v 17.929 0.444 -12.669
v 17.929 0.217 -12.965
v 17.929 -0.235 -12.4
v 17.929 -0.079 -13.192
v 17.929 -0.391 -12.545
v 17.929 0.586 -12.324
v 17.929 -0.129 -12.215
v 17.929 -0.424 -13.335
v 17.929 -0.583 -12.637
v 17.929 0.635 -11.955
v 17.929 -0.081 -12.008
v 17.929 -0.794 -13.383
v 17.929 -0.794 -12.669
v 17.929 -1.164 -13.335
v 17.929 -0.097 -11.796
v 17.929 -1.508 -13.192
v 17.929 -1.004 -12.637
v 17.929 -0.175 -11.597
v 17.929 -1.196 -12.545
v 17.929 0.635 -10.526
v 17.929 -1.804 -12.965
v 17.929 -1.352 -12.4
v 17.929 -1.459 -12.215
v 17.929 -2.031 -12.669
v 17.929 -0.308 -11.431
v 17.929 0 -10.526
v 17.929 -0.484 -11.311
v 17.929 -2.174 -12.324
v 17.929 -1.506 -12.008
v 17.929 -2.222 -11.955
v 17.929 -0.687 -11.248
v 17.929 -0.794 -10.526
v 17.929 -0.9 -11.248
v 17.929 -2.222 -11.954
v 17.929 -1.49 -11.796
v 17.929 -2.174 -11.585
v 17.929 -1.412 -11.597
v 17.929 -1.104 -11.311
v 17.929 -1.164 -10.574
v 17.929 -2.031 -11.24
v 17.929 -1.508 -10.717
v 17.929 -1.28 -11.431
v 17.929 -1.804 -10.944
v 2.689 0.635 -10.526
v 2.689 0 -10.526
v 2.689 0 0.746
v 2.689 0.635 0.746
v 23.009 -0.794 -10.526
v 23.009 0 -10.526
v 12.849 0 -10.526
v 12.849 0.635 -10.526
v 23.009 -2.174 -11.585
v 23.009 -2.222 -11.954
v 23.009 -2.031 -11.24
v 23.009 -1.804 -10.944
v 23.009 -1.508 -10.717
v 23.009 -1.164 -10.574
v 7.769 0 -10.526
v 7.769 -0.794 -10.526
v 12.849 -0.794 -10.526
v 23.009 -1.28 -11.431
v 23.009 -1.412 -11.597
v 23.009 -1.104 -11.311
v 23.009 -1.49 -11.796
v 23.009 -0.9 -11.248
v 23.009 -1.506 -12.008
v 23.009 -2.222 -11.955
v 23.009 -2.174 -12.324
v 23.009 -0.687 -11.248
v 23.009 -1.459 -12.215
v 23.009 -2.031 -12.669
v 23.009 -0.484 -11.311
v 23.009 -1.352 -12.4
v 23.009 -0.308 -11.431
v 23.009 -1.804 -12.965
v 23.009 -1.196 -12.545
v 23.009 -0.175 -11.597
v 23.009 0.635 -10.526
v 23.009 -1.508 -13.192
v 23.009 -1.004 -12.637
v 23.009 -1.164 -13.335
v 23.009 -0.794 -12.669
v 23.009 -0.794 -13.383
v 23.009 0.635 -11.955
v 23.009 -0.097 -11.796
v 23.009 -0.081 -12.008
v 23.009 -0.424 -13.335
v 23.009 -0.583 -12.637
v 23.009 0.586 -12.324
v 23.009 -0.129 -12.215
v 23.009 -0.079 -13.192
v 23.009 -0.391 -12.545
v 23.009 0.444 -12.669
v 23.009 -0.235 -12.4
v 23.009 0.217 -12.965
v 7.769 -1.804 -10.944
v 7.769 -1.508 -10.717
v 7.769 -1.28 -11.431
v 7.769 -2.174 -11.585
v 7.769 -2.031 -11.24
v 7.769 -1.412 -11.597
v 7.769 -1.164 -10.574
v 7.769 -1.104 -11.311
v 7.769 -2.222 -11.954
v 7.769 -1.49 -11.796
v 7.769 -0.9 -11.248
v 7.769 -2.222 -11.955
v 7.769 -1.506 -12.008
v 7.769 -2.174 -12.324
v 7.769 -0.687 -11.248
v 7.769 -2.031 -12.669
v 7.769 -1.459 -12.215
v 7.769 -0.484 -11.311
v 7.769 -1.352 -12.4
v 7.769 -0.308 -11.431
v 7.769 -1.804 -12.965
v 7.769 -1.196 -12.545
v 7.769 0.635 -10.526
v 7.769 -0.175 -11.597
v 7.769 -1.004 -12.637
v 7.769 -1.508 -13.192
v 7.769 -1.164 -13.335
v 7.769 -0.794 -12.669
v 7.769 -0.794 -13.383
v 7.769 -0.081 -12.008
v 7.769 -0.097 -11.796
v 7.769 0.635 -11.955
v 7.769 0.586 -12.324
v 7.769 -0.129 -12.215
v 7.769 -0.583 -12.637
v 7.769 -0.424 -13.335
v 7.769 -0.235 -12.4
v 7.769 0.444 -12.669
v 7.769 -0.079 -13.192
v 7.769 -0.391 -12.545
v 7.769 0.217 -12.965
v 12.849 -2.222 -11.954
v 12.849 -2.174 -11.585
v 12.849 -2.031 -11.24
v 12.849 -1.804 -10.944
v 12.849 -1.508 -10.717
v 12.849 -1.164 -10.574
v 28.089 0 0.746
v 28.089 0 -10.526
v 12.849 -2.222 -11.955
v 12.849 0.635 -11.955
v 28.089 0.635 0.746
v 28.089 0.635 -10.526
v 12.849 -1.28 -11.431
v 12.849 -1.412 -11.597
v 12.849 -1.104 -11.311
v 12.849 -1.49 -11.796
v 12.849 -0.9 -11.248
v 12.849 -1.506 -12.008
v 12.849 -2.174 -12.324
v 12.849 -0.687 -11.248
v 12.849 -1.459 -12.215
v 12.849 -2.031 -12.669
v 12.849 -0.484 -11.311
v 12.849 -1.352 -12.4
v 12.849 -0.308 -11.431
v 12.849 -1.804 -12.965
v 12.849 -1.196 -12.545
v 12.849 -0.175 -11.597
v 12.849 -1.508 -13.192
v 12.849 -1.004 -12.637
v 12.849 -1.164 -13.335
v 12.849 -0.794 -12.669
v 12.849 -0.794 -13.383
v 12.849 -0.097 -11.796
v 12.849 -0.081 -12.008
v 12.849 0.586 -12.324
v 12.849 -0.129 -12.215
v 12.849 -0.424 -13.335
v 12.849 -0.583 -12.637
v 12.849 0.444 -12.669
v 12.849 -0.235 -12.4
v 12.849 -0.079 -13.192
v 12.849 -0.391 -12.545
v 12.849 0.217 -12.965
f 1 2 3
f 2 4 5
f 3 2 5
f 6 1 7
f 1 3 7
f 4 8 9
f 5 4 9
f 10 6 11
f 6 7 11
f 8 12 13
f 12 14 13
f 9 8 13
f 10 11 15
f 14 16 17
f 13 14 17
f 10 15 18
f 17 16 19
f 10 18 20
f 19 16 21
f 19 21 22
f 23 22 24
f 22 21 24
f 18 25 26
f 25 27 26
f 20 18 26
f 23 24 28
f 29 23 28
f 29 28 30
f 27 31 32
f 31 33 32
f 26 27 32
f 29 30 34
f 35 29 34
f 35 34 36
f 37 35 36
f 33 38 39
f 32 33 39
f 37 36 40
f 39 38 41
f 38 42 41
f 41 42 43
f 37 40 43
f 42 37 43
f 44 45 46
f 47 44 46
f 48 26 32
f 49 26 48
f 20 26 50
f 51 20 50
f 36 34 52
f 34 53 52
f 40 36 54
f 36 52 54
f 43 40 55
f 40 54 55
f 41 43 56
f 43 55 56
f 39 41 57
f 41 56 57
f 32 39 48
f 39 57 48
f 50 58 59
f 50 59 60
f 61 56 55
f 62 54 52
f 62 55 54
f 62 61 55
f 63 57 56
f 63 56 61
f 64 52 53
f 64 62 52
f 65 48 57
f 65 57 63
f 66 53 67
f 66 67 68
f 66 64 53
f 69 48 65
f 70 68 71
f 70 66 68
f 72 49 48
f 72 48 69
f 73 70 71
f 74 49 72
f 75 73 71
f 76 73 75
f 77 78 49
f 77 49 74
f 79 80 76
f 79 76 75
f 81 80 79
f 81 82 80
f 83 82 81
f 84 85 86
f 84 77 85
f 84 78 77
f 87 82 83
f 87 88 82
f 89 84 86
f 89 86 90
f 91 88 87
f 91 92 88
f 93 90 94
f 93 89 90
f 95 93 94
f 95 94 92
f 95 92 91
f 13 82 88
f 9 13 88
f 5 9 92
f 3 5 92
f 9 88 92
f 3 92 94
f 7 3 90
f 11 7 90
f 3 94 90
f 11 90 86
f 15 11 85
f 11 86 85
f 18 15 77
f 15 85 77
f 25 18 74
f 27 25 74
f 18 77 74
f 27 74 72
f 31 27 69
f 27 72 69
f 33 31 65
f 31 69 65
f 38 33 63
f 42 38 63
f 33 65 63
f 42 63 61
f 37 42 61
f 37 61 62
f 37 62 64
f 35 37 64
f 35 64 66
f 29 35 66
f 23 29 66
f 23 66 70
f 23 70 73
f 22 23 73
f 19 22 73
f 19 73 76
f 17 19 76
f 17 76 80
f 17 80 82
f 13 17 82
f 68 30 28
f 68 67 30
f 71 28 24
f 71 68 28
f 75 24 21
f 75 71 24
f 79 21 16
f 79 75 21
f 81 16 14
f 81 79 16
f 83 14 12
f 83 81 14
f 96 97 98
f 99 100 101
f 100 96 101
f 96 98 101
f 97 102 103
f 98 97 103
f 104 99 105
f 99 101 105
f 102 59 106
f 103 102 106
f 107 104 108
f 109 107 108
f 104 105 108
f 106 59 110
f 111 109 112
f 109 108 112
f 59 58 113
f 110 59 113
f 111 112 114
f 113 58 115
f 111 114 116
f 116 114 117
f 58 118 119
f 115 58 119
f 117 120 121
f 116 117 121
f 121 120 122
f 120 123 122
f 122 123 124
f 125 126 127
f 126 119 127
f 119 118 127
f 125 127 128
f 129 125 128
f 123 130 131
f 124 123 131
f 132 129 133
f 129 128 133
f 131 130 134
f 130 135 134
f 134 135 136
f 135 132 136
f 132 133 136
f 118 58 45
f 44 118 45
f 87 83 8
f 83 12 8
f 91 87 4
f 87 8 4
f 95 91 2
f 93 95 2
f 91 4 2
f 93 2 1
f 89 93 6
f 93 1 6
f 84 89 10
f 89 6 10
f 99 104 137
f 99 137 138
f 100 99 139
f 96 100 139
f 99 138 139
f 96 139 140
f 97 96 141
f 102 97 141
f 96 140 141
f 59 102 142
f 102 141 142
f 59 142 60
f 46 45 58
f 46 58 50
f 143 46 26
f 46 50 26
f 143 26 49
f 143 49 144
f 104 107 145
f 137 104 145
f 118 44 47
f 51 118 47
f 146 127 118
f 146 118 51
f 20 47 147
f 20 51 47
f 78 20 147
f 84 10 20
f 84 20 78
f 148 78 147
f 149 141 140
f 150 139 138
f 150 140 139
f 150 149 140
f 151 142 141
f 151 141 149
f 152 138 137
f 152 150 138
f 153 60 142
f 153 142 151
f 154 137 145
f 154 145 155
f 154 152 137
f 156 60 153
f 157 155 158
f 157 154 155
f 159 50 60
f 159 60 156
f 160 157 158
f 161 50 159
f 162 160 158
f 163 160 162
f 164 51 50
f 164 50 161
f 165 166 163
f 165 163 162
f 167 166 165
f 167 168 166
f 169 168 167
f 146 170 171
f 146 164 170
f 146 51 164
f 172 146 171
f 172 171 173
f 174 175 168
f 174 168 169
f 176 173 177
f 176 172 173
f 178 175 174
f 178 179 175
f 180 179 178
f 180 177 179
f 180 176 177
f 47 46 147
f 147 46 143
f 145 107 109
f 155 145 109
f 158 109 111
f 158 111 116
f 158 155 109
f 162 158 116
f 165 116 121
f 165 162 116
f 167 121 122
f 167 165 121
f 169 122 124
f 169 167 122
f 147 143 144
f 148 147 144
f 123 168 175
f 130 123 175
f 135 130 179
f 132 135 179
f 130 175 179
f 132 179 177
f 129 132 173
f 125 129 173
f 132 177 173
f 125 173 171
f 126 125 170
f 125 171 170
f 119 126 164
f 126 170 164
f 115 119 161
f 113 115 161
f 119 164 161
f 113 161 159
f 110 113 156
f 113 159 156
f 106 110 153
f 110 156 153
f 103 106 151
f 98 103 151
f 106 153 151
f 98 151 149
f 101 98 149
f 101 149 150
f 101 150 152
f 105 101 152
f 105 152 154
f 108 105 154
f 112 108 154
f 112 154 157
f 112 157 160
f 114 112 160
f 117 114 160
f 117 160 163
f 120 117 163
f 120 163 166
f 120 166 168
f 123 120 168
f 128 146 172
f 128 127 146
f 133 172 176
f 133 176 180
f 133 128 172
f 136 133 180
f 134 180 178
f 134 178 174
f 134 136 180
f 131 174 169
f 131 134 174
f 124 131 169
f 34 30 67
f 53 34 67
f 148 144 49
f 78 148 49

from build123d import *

# Parameters (mm, degrees)
BOSS_EXTRUDE1_DEPTH = 0.635
SKETCH2_W           = 5.08
SKETCH2_H           = 2.8575
BOSS_EXTRUDE2_DEPTH = 2.8575
FILLET1_R           = 1.42875
SKETCH3_R           = 0.714375
CUT_EXTRUDE1_DEPTH  = 30


with BuildPart() as part:
    # Sketch1 → Boss-Extrude1 (new body)
    with BuildSketch(Plane(origin=(0, 0, 0), x_dir=(1, 0, 0), z_dir=(0, 1, 0))):
        Polygon((12.849131833, 13.383236071), (7.769131833, 13.383236071), (7.769131833, 10.525736071), (2.689131833, 10.525736071), (2.689131833, -0.745513929), (28.089131833, -0.745513929), (28.089131833, 10.525736071), (23.009131833, 10.525736071), (23.009131833, 13.383236071), (17.929131833, 13.383236071), (17.929131833, 10.525736071), (12.849131833, 10.525736071), align=None)
    extrude(amount=BOSS_EXTRUDE1_DEPTH)

    # Sketch2 → Boss-Extrude2 (add)
    with BuildSketch(Plane(origin=(0, 0.635, 0), x_dir=(1, 0, 0), z_dir=(0, 1, 0))):
        with Locations((10.309131833, 11.954486071)):
            Rectangle(SKETCH2_W, SKETCH2_H)
        with Locations((20.469131833, 11.954486071)):
            Rectangle(SKETCH2_W, SKETCH2_H)
    extrude(amount=-BOSS_EXTRUDE2_DEPTH)

    # Fillet1
    fillet1_edges = [part.edges().sort_by_distance(p)[0] for p in [
        (10.309131833, -2.2225, -10.525736071),
        (20.469131833, -2.2225, -10.525736071),
        (20.469131833, -2.2225, -13.383236071),
        (10.309131833, -2.2225, -13.383236071),
        (10.309131833, 0.635, -13.383236071),
        (20.469131833, 0.635, -13.383236071),
    ]]
    fillet(fillet1_edges, radius=FILLET1_R - 0.0001)  # a hair under: the kernel refuses the full size

    # Sketch3 → Cut-Extrude1 (cut)
    with BuildSketch(Plane(origin=(23.009131833, 0, 0), x_dir=(0, 0, -1), z_dir=(1, 0, 0))):
        with Locations((11.954486071, -0.79375)):
            Circle(SKETCH3_R)
    extrude(amount=-CUT_EXTRUDE1_DEPTH, mode=Mode.SUBTRACT)


solid = part.part
